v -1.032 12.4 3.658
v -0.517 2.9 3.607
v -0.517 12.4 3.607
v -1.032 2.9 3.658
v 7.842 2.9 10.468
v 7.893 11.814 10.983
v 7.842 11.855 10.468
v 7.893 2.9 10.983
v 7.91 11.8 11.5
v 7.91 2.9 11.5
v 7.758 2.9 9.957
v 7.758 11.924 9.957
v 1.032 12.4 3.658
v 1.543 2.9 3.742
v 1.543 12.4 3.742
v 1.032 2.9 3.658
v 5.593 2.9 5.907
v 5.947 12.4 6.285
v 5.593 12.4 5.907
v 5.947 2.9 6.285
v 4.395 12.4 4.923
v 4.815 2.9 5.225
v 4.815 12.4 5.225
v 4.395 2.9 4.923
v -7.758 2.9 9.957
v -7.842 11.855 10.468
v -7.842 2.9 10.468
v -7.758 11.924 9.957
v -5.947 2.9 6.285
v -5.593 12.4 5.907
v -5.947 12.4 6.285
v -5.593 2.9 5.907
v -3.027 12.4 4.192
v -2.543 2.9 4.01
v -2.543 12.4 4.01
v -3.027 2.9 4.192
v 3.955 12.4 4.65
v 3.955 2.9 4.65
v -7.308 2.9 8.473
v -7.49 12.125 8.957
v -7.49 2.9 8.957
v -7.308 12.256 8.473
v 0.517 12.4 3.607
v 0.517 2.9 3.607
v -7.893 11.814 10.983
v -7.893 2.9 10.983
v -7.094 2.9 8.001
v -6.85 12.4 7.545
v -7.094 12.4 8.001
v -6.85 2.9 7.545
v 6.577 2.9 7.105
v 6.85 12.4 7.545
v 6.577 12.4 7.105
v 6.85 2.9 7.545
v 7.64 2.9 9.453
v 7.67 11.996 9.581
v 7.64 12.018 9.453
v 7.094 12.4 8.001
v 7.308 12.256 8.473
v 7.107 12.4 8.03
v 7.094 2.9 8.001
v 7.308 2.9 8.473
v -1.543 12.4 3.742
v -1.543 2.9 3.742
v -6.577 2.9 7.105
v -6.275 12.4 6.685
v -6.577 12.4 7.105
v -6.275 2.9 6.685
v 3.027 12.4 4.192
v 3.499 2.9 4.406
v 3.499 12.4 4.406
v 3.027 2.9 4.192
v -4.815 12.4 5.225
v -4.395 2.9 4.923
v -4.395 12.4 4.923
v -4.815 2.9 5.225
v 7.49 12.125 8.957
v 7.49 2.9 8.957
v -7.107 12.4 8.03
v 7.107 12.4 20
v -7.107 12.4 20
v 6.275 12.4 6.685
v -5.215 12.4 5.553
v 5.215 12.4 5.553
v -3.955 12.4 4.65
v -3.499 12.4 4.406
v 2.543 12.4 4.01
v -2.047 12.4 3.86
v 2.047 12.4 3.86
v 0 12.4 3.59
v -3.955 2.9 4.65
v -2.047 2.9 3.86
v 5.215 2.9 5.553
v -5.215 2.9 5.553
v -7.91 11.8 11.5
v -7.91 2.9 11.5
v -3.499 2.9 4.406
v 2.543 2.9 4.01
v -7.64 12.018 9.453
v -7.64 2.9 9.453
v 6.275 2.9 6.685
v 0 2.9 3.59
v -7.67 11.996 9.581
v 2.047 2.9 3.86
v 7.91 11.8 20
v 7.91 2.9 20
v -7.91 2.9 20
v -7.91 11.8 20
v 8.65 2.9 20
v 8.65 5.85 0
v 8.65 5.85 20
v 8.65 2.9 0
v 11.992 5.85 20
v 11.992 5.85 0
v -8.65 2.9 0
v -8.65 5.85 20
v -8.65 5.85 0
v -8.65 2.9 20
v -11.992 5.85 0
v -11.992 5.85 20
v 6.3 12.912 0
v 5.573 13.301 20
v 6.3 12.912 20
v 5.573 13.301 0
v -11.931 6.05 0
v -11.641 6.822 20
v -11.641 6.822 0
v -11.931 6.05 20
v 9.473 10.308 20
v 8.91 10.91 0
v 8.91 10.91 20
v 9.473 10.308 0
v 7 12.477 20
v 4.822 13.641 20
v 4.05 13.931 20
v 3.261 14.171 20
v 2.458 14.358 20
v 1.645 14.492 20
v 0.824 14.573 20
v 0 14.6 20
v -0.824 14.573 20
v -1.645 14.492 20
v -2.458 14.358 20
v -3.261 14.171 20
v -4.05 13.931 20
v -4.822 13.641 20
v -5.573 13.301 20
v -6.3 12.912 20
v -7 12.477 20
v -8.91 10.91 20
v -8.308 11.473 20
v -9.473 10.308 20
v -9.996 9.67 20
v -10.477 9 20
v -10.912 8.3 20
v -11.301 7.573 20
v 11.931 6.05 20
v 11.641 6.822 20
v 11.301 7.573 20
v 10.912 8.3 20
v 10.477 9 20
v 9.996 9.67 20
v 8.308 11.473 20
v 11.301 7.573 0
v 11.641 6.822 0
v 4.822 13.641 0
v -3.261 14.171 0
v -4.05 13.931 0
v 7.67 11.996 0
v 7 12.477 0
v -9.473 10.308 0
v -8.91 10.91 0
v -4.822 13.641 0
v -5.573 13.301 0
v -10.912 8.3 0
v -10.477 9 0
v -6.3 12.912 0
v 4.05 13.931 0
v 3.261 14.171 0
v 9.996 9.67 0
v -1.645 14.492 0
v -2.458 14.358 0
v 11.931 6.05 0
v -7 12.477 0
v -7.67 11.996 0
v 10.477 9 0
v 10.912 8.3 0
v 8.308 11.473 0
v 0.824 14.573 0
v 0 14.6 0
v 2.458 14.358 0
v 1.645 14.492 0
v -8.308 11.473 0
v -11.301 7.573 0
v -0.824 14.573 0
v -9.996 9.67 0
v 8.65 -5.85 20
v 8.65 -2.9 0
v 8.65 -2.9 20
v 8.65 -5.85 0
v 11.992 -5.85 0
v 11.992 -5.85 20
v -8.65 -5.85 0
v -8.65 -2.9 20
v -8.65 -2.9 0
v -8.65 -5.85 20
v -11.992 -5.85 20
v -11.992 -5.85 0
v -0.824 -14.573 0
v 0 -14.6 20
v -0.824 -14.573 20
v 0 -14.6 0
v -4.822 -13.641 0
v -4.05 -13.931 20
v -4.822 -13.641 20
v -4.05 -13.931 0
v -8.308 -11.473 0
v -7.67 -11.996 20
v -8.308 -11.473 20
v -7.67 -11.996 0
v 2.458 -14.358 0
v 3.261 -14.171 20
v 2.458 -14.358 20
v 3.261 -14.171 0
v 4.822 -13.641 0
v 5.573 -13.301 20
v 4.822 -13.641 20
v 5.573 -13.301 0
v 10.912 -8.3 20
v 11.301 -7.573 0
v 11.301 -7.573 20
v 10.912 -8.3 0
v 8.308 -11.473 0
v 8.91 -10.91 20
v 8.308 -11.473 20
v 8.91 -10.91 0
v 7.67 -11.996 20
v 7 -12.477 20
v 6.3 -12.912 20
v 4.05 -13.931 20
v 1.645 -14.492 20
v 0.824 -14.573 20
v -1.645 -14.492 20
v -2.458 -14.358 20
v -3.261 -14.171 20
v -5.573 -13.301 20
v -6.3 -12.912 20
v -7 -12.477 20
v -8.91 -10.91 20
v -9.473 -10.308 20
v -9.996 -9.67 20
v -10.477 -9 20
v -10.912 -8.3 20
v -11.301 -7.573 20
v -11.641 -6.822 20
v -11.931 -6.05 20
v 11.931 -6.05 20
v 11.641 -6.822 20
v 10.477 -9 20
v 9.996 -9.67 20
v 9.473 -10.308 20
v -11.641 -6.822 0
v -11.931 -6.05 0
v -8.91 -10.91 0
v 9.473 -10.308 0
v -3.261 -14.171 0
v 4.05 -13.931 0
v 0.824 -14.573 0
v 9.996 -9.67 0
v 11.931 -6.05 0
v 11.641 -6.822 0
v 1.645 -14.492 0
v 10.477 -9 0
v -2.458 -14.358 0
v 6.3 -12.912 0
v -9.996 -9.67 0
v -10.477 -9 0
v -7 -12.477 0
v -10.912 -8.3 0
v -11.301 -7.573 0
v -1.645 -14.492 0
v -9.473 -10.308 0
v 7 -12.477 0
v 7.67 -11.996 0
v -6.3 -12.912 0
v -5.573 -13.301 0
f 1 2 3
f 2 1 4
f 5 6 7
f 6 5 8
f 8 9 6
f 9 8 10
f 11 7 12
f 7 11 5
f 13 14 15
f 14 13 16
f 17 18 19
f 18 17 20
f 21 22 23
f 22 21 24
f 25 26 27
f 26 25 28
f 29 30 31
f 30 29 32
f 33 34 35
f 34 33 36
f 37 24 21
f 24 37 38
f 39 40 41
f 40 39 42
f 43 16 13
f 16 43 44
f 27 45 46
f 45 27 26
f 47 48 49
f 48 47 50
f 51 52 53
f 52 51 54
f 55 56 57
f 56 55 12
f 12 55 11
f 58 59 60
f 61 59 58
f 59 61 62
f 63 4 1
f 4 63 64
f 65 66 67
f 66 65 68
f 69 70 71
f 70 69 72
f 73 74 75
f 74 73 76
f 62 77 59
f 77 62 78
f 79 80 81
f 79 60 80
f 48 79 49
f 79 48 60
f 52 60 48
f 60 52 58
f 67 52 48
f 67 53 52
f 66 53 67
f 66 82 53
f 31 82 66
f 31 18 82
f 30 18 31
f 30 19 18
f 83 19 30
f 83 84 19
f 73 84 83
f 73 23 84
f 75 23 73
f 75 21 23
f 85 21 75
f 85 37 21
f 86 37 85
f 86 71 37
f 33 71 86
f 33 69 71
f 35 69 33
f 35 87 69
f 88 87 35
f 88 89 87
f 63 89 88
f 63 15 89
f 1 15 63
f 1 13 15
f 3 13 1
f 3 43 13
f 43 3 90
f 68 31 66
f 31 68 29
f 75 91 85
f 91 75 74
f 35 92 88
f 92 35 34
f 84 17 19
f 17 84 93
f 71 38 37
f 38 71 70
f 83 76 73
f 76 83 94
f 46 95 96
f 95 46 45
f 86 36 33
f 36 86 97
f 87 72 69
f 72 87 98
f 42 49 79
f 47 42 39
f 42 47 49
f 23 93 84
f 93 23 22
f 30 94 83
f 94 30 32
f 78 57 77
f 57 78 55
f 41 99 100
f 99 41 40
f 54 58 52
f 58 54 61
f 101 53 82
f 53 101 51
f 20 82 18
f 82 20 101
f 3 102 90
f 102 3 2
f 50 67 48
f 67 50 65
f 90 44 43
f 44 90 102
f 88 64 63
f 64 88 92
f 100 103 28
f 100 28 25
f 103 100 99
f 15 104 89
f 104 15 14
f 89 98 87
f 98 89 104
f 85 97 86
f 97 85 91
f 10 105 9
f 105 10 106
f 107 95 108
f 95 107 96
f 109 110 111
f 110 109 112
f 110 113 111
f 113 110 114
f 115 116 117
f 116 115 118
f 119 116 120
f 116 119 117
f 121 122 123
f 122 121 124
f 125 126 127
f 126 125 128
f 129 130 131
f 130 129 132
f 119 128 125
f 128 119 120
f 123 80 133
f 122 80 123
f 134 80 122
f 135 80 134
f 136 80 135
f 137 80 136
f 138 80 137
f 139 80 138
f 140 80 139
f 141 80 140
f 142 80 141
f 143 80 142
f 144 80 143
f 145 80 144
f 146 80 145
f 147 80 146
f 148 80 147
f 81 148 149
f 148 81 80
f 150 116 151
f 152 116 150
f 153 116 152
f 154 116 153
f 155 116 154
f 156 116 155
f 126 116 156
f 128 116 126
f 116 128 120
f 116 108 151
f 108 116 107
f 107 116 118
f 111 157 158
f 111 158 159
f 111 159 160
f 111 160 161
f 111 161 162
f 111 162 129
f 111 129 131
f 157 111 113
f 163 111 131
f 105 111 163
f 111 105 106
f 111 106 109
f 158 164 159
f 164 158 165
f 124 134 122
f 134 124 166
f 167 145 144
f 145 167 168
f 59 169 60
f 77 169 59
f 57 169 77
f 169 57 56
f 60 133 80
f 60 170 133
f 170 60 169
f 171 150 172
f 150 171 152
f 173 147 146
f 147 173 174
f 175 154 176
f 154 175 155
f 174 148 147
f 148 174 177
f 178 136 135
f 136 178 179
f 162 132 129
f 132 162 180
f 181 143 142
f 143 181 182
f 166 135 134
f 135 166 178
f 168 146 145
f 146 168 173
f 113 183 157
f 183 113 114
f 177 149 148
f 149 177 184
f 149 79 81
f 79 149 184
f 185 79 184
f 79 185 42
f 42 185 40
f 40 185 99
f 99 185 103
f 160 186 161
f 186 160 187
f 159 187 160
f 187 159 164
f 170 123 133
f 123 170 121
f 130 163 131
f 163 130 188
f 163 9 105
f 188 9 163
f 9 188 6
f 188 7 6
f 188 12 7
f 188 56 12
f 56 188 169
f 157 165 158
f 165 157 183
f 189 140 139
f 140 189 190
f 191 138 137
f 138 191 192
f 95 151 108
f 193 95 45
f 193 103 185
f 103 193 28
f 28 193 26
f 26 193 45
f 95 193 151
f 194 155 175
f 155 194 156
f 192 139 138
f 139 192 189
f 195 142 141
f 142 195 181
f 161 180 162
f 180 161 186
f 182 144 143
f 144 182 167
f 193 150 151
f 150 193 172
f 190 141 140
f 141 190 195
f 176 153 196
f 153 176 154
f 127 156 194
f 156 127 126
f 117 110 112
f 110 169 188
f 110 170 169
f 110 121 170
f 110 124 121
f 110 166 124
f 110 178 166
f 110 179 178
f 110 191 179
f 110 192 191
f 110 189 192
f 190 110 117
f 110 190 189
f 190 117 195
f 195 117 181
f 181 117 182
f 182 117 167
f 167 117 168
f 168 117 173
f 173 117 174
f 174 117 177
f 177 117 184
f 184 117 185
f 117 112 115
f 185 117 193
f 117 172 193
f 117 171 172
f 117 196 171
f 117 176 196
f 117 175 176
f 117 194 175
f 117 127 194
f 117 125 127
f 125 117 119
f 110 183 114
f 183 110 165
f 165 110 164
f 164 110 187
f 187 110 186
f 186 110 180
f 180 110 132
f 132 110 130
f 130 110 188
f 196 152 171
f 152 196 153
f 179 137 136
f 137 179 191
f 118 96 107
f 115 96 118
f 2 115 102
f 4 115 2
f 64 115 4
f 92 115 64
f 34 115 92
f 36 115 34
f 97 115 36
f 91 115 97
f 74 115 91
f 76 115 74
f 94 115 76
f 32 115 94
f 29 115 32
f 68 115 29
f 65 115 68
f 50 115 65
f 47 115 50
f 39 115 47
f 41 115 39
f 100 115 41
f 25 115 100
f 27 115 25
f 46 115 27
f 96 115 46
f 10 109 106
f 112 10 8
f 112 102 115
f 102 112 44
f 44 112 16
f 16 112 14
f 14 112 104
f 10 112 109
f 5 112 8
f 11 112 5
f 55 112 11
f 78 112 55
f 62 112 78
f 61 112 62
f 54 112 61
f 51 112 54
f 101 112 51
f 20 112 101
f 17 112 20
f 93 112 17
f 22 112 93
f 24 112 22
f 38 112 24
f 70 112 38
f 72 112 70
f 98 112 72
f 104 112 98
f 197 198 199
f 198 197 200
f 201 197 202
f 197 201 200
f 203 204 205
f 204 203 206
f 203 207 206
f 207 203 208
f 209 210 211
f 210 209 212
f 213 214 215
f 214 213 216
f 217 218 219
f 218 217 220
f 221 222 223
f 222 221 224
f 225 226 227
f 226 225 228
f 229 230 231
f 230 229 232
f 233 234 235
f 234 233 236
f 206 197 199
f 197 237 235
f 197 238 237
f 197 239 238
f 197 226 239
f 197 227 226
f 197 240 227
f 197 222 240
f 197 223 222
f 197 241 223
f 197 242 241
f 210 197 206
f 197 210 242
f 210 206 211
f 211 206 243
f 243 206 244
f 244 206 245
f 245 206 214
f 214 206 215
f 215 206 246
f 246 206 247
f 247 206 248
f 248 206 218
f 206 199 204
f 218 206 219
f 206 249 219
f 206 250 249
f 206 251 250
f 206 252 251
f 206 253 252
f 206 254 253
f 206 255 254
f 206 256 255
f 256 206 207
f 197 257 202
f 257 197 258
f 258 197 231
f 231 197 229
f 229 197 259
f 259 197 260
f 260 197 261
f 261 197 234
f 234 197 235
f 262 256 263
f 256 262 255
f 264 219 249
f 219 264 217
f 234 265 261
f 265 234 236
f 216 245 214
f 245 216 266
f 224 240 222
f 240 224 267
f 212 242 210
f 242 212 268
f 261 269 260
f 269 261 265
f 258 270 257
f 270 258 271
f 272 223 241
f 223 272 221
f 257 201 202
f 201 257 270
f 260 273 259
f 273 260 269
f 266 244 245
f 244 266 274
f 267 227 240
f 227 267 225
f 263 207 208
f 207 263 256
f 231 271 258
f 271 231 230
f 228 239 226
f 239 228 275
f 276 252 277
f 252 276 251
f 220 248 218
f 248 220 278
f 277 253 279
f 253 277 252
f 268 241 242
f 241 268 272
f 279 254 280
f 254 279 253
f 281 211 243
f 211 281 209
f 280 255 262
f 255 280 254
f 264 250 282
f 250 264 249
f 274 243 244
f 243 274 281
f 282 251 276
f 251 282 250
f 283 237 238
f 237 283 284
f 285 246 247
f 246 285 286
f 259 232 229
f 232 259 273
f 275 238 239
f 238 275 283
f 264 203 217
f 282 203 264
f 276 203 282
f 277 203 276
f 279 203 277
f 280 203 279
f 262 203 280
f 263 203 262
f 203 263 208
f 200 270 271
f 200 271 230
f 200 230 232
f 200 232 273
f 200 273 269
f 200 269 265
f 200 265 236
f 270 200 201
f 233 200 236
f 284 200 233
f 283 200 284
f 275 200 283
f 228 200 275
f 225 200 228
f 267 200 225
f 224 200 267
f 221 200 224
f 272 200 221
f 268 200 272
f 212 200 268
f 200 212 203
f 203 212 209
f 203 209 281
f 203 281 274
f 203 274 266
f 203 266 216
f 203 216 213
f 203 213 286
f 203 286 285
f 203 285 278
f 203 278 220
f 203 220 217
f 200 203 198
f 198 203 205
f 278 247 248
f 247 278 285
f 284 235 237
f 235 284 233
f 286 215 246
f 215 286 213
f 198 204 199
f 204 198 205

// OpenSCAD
/*
 * o2_probe_gas_shell.scad -- the wall between the sensor chamber and the
 * electronics chamber, for a probe that is COATED rather than POTTED.
 *
 * WHY THIS PART EXISTS
 *
 * The cell rides the board (standing mount, PLACEMENT.md datum (10, 93.5)) and
 * the board comes out the CABLE end. o2_probe_head_end.scad echoes that itself:
 *
 *     CELL SERVICE: standing mount -- the cell rides the board and comes out
 *     the CABLE end. No extraction through the head [...]
 *
 * So the cell is already field-replaceable, by exactly one route: pop the cap,
 * pull the board. POTTING.md pours 50 cm3 of PU down that route. Fab, 2026-09-06:
 * coat the board instead and leave the tube full of air -- which restores the
 * service path and costs the one thing the pot actually bought, a place where
 * water cannot condense.
 *
 * But the air is not free, and the reason is RESPONSE TIME, not moisture.
 * o2_probe_body_tube.scad measures it:
 *
 *     GAS VOLUME, unpotted: head cavity 4.3671 cm3 + tube 57.6522
 *     + tail 12.7835 = 74.8029 cm3, 14.9606x the 5.0 cm3 budget.
 *
 * The pot was holding that number down by filling the tube. Take it out and
 * something else has to. This part is that something else.
 *
 * WHAT IT IS NOT
 *
 * It is NOT the `dam` in o2_probe_body_tube.scad. That part is honest about
 * itself -- "a loose split disc, not a seal: 204 mm2 of a 581 mm2 bore stays
 * open, so at equilibrium the tail is still connected". A restrictor splits one
 * time constant into two. It removes no volume.
 *
 * It is also NOT a bulkhead at the y=82 potting datum. A plain wall there leaves
 * the whole tube bore from 82 to the head socket inside the gas chamber, and the
 * can itself spans board y 86.19..100.81, so a wall behind it cannot go further
 * forward than ~85.5 anyway. Bore area is 581 mm2: every millimetre of open bore
 * left on the gas side costs 0.58 cm3, and the budget is 5.0 TOTAL.
 *
 * So a wall is necessary and nowhere near sufficient. What closes the number is
 * FILLING -- occupying the bore around the can and leaving a defined gas gap. The
 * separator and the filler are the same part, and that is this one.
 *
 * WHAT IS STILL OPEN, AND IT IS THE WHOLE DESIGN
 *
 * The shell has to reach board y~93 through the cable end, so it must pass the
 * Ø25.7 collar (o2_probe_body_tube.scad, cable_bore_d). That caps its OD at 25.2,
 * inside a 27.2 bore -- an annulus 1.0 mm deep that is a wide-open bypass duct
 * around the whole part. Closing it is the open question and `shell_seal` is
 * where the three answers live. Nothing here decides it; the model MEASURES what
 * each one costs. See CELL-SERVICE-AND-THE-WALL.md.
 *
 * FRAME. z = board y minus shell_y0. x = across the board (board centreline at
 * x=0; KiCad's x=10 is here x=0). y = board normal, +y toward the component
 * front, which is the side the cell stands on.
 */

$fn = 96;
e = 0.01;

part = "shell";

// ------------------------------------------------- mirrors
//
// Every number in this block belongs to another file. They are restated because
// the three models cannot include one another (see tools/interface_check.py's
// docstring for why), and restated numbers drift -- so interface_check.py
// compares these against their sources. Do not hand-edit one without running it.

board_w   = 20.0;           // o2_probe_body_tube.scad, board_w
board_t   = 1.6;            // o2_probe_body_tube.scad, board_t
board_len = 107.0;          // o2_probe_body_tube.scad, board_len
tube_id   = 27.2;           // o2_probe_body_tube.scad, tube_id
collar_bore = 25.7;         // o2_probe_body_tube.scad, cable_bore_d

// The guide rails. The shell has to pass station A on its way in and cannot,
// unless it carries channels the rails run through -- the rail reaches from
// x=9.0 (board_w/2 - guide_engage) out to 14.8, over 7.0 mm of board normal, so
// a Ø25.2 disc fouls it by 3.6 mm on each side. This is not a detail; it is why
// the shell is not a plain disc.
guide_engage = 1.0;         // o2_probe_body_tube.scad, guide_engage
guide_body   = 7.0;         // o2_probe_body_tube.scad, guide_body

// The cell, standing. cell_seated_h is measured from the board SURFACE, which is
// how o2_probe_head_end.scad uses it (cell_stand_r adds board_t/2 to it).
cell_d = 14.62;             // o2_probe_head_end.scad, cell_d (MEASURED)
cell_h = 8.3;               // o2_probe_head_end.scad, cell_h (DS-0637 Iss. 2)
cell_seated_h = 8.8;        // Makefile HEAD_END_PROV -- PROVISIONAL, see below
cell_y = 93.5;              // PLACEMENT.md controlled datum, board y of the axis

// ------------------------------------------------- span
//
// The cable-side face. It cannot go forward of 85.5 -- the can's own back edge
// is at cell_y - cell_d/2 = 86.19 -- and it should not go back of 81.3, which is
// where o2_probe_body_tube.scad's edge scan says both board edges stop being
// clear. 82.0 is the potting datum's own line, which is not a coincidence: it is
// the one plane on this board that the layout has already been told to keep free.
shell_y0 = 82.0;
// The forward face: where the tube ends and the head's bore takes over. This is
// the MONOLITHIC number (tube_len 124 less tail_len 22). Bonded, the tube runs to
// 105 and the shell could be longer; it is not, because the same part has to fit
// both joints.
shell_y1 = 102.0;
shell_len = shell_y1 - shell_y0;

// OD. Set by the collar, not by the bore it runs in.
shell_pass_clr = 0.5;       // diametral, shell OD under the collar bore
shell_od = collar_bore - shell_pass_clr;

// Fits. The shell is bonded to the board (it leaves with the board and is part
// of that assembly), so these are bond gaps, not sliding fits.
board_slot_w = board_w + 0.30;
board_slot_t = board_t + 0.20;
rail_clr     = 0.35;        // on the rail channel, all round
cell_gap_r   = 0.60;        // gas gap around the can's rim
cell_gap_t   = 0.80;        // gas gap over the can's sensing face
wall_min     = 1.20;        // thinnest wall this part is allowed anywhere

// The seal to the tube bore. THIS IS THE OPEN DECISION, not a setting with a
// right answer, and each branch is a different probe:
//
//   "none"   the annulus stays open. The shell displaces volume and restricts
//            flow; it does not divide the probe into two chambers. Honest, and
//            what a first article should be built as, because it is the only
//            branch that needs nothing decided.
//   "lip"    a printed conical skirt, thin enough to deflect through the Ø25.7
//            collar and spring back in the Ø27.2 bore. Costs nothing to try and
//            needs a coupon before it is believed -- an ASA lip at pile
//            temperature for a season is not a spring.
//   "oring"  a real radial seal at Ø27.2. Genuinely two chambers, and it CANNOT
//            PASS THE COLLAR: a 2.0 cord on the ~Ø24 root it needs relaxes to
//            ~Ø28, and driving that through Ø25.7 is 57 % squeeze at the lip.
//            This branch requires the cable end to go back to a full Ø27.2 bore,
//            i.e. giving up the 22 x 2 cap ring. The assert below says so rather
//            than letting the geometry render as though it were free.
shell_seal = "none";
assert(shell_seal == "none" || shell_seal == "lip" || shell_seal == "oring",
       str("unknown shell_seal '", shell_seal, "'"));

// Does station B's rail run the length of the shell? It does not today --
// o2_probe_body_tube.scad has station_b = [82, 90] for the monolithic joint,
// sized when head_socket_len was 14 and the tube stopped at board y=91. It is 3
// now and the tube runs to 102, so that limit is stale and the rail could cover
// the whole shell. That matters here for one reason: a rail inside the channel
// PLUGS it, and the channels are the second-largest gas term in the part. This
// flag is what lets the model weigh the difference instead of arguing it.
rails_in_span = false;

lip_t     = 0.45;           // printed skirt wall
lip_over  = 0.10;           // how far past the bore it stands, diametral
lip_len   = 2.5;

// The `oring` branch needs the collar gone. Nothing in this file can remove it,
// so it refuses to draw a seal that cannot be installed -- the failure mode this
// guards against is a model that renders a perfectly good ring into a bore no
// ring can reach, and gates that all pass because none of them simulate assembly.
cable_end_bore_is_full = false;   // set true ONLY when the collar is deleted
assert(shell_seal != "oring" || cable_end_bore_is_full,
       str("shell_seal=oring seals at Ø", tube_id, ", which needs a groove root near Ø24 ",
           "and a ring that relaxes to about Ø28. It has to be pushed through the Ø",
           collar_bore, " collar to get there -- ", 100*((28 - collar_bore)/2)/2,
           " % squeeze at the lip, which rolls or shaves the ring. Either delete ",
           "the collar (and with it the 22 x 2 cap seal) and set ",
           "cable_end_bore_is_full=true, or use shell_seal=\"lip\"/\"none\"."));

// ------------------------------------------------- derived and gated

cell_z    = cell_y - shell_y0;              // the can's axis, in shell z
pocket_d  = cell_d + 2*cell_gap_r;
pocket_y0 = board_t/2;                      // board front surface
pocket_y1 = board_t/2 + cell_seated_h + cell_gap_t;
rail_x0   = board_w/2 - guide_engage;       // 9.0, the rail's inner face

assert(cell_y - cell_d/2 > shell_y0 + wall_min,
       str("the can's back edge is at board y ", cell_y - cell_d/2,
           " and the shell's back face at ", shell_y0,
           ": less than ", wall_min, " mm of wall between them"));
assert(cell_y + cell_d/2 < shell_y1,
       str("the can's front edge is at board y ", cell_y + cell_d/2,
           " and the shell ends at ", shell_y1, ": the can is not inside the shell"));
assert(shell_y0 >= 81.3 && shell_y1 <= 103.6,
       str("the shell spans board y ", shell_y0, "..", shell_y1,
           ", outside the 81.3..103.6 band where o2_probe_body_tube.scad's edge ",
           "scan says BOTH board edges are clear. It would sit on a pad."));
assert(shell_od <= collar_bore - shell_pass_clr + 1e-9,
       str("shell OD ", shell_od, " does not pass the Ø", collar_bore, " collar"));
// The wall over the can's sensing face. This is the thinnest place in the part
// and it is the one that has to hold the gas gap open, so it is checked rather
// than eyeballed off the render.
cap_wall = shell_od/2 - pocket_y1;
assert(cap_wall >= wall_min,
       str("only ", cap_wall, " mm of shell over the can's face (pocket top at y=",
           pocket_y1, ", OD ", shell_od, "): below ", wall_min,
           " it prints as two lines and collapses into the gas gap"));
// The rail channel eats the part from x=9.0 outward. What is left holding the
// two halves together across the board is the material between the board slot
// and the channel, and at guide_engage=1.0 that is nothing at all -- the channel
// starts exactly where the slot's engagement ends. Say so.
web = rail_x0 - rail_clr - board_slot_w/2;
assert(web <= 0 || web >= wall_min,
       str("the web between the board slot and the rail channel is ", web,
           " mm -- either make it >= ", wall_min, " or accept 0 and bond across it"));

// ------------------------------------------------- volume, MEASURED not modelled
//
// These are the analytic numbers, and they are here to be CONTRADICTED. The gate
// is `part="gas"` weighed on the mesh, because every volume model in this project
// that was not weighed has been wrong at least once. cav_net in the head file was
// out by 3.1 cm3; head_cavity in the body file was quoting the bonded head while
// the file defaulted to monolithic.
bore_area   = PI*pow(tube_id/2, 2);
annulus_vol = (bore_area - PI*pow(shell_od/2, 2)) * shell_len;
rail_vol    = rails_in_span ? 0
            : 2 * (shell_od/2 - rail_x0 + rail_clr) * (guide_body + 2*rail_clr) * shell_len;
pocket_vol  = PI*pow(pocket_d/2, 2)*(pocket_y1 - pocket_y0) - PI*pow(cell_d/2, 2)*cell_h;

echo(str("GAS SHELL: board y ", shell_y0, "..", shell_y1, " (", shell_len,
         " mm), OD ", shell_od, " in a ", tube_id, " bore, seal \"", shell_seal, "\"."));
echo(str("GAS SHELL model (weigh part=\"gas\" instead): annulus ", annulus_vol/1000,
         " + rail channels ", rail_vol/1000, " + cell pocket ", pocket_vol/1000,
         " = ", (annulus_vol + rail_vol + pocket_vol)/1000, " cm3."));
// What is actually left for it. The head spends most of the budget by itself and
// the monolithic head spends nearly all of it -- which is a statement about the
// JOINT, not about this part, and it is the single most useful number here.
echo(str("BUDGET: the 5.0 cm3 gate less the head's own cavity leaves 2.0715 cm3 ",
         "bonded and 0.6329 cm3 monolithic (meshes, tools/interface_check.py). ",
         "The annulus alone is ", annulus_vol/1000,
         " cm3. THE MONOBODY CANNOT MEET THE BUDGET WHATEVER THIS PART DOES."));
echo(str("UNMEASURED: cell_seated_h ", cell_seated_h,
         " is the Makefile's provisional value, and it sets the gas gap over the ",
         "sensing face directly. Seat a real cell in a real socket before printing."));

// ------------------------------------------------- geometry

// The rail channels, as a cutter. Full length, both edges, with the board slot's
// own clearance folded in -- the rail is a U straddling the board and the shell
// has to clear both prongs.
module rail_channels() {
    for (sx = [1, -1])
        scale([sx, 1, 1])
            translate([rail_x0 - rail_clr, -(guide_body/2 + rail_clr), -e])
                cube([shell_od, guide_body + 2*rail_clr, shell_len + 2*e]);
}

// The gas pocket around the can, opening FORWARD into the head's bore. It has to
// open somewhere or it is a sealed bubble with the cell inside it, and forward is
// the only direction with a head on the other end. The forward cut runs to the
// face rather than stopping short: at pocket_d 15.82 the can's front edge is
// 0.59 mm from the face anyway, so a "duct" here would be a fiction.
module gas_pocket() {
    translate([0, pocket_y0, cell_z]) rotate([-90, 0, 0])
        cylinder(d=pocket_d, h=pocket_y1 - pocket_y0);
    // the forward opening
    translate([-pocket_d/2, pocket_y0, cell_z])
        cube([pocket_d, pocket_y1 - pocket_y0, shell_len - cell_z + e]);
}

// The guide rail's own solid, copied from o2_probe_body_tube.scad's guide(): a
// block from the board's engaged edge out to guide_r_max, guide_body wide across
// the board plane, with the board slot cut through it. Drawn ONLY to be
// subtracted from the gas -- this file does not own the rail and must not export
// one. Clipped to the tube bore, which is where the shell's channel ends anyway.
module rails() {
    for (sx = [1, -1])
        scale([sx, 1, 1])
            difference() {
                intersection() {
                    translate([rail_x0, -guide_body/2, -e])
                        cube([tube_id, guide_body, shell_len + 2*e]);
                    cylinder(d=tube_id, h=shell_len + 2*e, center=false);
                }
                translate([-tube_id, -board_slot_t/2, -2*e])
                    cube([2*tube_id, board_slot_t, shell_len + 4*e]);
            }
}

module lip_skirt(z, dir) {
    // A cone standing proud of the bore, thin enough to fold through the collar.
    translate([0, 0, z])
        scale([1, 1, dir])
            difference() {
                cylinder(d1=shell_od, d2=tube_id + lip_over, h=lip_len);
                translate([0, 0, -e])
                    cylinder(d1=shell_od - 2*lip_t, d2=tube_id + lip_over - 2*lip_t,
                             h=lip_len + 2*e);
            }
}

module shell_solid() {
    difference() {
        union() {
            cylinder(d=shell_od, h=shell_len);
            if (shell_seal == "lip") {
                lip_skirt(1.0, 1);
                lip_skirt(shell_len - 1.0, -1);
            }
        }
        // the board, straight through
        translate([-board_slot_w/2, -board_slot_t/2, -e])
            cube([board_slot_w, board_slot_t, shell_len + 2*e]);
        gas_pocket();
        rail_channels();
        if (shell_seal == "oring") {
            // Root sized for 20 % squeeze on a 2.0 cord in the Ø27.2 bore. Only
            // reachable with the collar gone -- the assert above is the gate.
            groove_root = tube_id - 2*2.0*(1 - 0.20);
            translate([0, 0, shell_len/2 - 1.4])
                difference() {
                    cylinder(d=shell_od + 2*e, h=2.8);
                    cylinder(d=groove_root, h=2.8);
                }
        }
    }
}

// Two halves, split on the board plane, exactly as the dam is. Each half is
// bonded to the board; the board plus its shell is the serviceable unit.
module shell_half(sign) {
    intersection() {
        shell_solid();
        translate([-tube_id, sign > 0 ? board_slot_t/2 : -tube_id, -e])
            cube([2*tube_id, tube_id, shell_len + 2*e]);
    }
}

module shell() {
    translate([0,  2, 0]) shell_half( 1);
    translate([0, -2, 0]) shell_half(-1);
}

// The board and the can, for the preview and for the gas Boolean. Representative,
// never exported -- the board belongs to KiCad.
module board_and_cell(stub = false) {
    // The full board is what `gas()` has to cut with -- it runs the length of the
    // tube and the void has to be cut by all of it. `stub` is for the preview
    // only: 107 mm of board in a picture of a 20 mm part shows the part as a
    // speck. It changes nothing that is measured.
    z0 = stub ? -8 : -shell_y0;
    z1 = stub ? shell_len + 8 : board_len - shell_y0;
    translate([-board_w/2, -board_t/2, z0])
        cube([board_w, board_t, z1 - z0]);
    translate([0, board_t/2 + cell_seated_h - cell_h, cell_z]) rotate([-90, 0, 0])
        cylinder(d=cell_d, h=cell_h);
}

// THE GATE. The connected gas inside the shell's span: everything in the tube
// bore that is neither shell, nor board, nor can. It counts the annulus and the
// rail channels automatically, which is the point -- those are the two terms a
// hand-written model forgets, and they are the two largest.
module gas() {
    difference() {
        translate([0, 0, 0]) cylinder(d=tube_id, h=shell_len);
        shell_solid();
        board_and_cell();
        if (rails_in_span) rails();
    }
}

module assembly() {
    color("SlateGray", 0.9) shell();
    color("ForestGreen") board_and_cell(stub = true);
    %translate([0, 0, -8]) cylinder(d=tube_id, h=shell_len + 16);
}

// The half that carries the cell pocket, opened up so the gas gap is visible.
// The pocket is the whole point of the part and it is invisible from outside.
module section() {
    color("SlateGray") difference() {
        shell_half(1);
        translate([-tube_id, -e, -e]) cube([tube_id, tube_id, shell_len + 2*e]);
    }
    color("ForestGreen") board_and_cell(stub = true);
}

if (part == "shell") shell();
else if (part == "half-front") shell_half(1);
else if (part == "half-back") shell_half(-1);
else if (part == "gas") gas();
else if (part == "assembly") assembly();
else if (part == "section") section();
else assert(false, str("unknown part '", part, "'"));
